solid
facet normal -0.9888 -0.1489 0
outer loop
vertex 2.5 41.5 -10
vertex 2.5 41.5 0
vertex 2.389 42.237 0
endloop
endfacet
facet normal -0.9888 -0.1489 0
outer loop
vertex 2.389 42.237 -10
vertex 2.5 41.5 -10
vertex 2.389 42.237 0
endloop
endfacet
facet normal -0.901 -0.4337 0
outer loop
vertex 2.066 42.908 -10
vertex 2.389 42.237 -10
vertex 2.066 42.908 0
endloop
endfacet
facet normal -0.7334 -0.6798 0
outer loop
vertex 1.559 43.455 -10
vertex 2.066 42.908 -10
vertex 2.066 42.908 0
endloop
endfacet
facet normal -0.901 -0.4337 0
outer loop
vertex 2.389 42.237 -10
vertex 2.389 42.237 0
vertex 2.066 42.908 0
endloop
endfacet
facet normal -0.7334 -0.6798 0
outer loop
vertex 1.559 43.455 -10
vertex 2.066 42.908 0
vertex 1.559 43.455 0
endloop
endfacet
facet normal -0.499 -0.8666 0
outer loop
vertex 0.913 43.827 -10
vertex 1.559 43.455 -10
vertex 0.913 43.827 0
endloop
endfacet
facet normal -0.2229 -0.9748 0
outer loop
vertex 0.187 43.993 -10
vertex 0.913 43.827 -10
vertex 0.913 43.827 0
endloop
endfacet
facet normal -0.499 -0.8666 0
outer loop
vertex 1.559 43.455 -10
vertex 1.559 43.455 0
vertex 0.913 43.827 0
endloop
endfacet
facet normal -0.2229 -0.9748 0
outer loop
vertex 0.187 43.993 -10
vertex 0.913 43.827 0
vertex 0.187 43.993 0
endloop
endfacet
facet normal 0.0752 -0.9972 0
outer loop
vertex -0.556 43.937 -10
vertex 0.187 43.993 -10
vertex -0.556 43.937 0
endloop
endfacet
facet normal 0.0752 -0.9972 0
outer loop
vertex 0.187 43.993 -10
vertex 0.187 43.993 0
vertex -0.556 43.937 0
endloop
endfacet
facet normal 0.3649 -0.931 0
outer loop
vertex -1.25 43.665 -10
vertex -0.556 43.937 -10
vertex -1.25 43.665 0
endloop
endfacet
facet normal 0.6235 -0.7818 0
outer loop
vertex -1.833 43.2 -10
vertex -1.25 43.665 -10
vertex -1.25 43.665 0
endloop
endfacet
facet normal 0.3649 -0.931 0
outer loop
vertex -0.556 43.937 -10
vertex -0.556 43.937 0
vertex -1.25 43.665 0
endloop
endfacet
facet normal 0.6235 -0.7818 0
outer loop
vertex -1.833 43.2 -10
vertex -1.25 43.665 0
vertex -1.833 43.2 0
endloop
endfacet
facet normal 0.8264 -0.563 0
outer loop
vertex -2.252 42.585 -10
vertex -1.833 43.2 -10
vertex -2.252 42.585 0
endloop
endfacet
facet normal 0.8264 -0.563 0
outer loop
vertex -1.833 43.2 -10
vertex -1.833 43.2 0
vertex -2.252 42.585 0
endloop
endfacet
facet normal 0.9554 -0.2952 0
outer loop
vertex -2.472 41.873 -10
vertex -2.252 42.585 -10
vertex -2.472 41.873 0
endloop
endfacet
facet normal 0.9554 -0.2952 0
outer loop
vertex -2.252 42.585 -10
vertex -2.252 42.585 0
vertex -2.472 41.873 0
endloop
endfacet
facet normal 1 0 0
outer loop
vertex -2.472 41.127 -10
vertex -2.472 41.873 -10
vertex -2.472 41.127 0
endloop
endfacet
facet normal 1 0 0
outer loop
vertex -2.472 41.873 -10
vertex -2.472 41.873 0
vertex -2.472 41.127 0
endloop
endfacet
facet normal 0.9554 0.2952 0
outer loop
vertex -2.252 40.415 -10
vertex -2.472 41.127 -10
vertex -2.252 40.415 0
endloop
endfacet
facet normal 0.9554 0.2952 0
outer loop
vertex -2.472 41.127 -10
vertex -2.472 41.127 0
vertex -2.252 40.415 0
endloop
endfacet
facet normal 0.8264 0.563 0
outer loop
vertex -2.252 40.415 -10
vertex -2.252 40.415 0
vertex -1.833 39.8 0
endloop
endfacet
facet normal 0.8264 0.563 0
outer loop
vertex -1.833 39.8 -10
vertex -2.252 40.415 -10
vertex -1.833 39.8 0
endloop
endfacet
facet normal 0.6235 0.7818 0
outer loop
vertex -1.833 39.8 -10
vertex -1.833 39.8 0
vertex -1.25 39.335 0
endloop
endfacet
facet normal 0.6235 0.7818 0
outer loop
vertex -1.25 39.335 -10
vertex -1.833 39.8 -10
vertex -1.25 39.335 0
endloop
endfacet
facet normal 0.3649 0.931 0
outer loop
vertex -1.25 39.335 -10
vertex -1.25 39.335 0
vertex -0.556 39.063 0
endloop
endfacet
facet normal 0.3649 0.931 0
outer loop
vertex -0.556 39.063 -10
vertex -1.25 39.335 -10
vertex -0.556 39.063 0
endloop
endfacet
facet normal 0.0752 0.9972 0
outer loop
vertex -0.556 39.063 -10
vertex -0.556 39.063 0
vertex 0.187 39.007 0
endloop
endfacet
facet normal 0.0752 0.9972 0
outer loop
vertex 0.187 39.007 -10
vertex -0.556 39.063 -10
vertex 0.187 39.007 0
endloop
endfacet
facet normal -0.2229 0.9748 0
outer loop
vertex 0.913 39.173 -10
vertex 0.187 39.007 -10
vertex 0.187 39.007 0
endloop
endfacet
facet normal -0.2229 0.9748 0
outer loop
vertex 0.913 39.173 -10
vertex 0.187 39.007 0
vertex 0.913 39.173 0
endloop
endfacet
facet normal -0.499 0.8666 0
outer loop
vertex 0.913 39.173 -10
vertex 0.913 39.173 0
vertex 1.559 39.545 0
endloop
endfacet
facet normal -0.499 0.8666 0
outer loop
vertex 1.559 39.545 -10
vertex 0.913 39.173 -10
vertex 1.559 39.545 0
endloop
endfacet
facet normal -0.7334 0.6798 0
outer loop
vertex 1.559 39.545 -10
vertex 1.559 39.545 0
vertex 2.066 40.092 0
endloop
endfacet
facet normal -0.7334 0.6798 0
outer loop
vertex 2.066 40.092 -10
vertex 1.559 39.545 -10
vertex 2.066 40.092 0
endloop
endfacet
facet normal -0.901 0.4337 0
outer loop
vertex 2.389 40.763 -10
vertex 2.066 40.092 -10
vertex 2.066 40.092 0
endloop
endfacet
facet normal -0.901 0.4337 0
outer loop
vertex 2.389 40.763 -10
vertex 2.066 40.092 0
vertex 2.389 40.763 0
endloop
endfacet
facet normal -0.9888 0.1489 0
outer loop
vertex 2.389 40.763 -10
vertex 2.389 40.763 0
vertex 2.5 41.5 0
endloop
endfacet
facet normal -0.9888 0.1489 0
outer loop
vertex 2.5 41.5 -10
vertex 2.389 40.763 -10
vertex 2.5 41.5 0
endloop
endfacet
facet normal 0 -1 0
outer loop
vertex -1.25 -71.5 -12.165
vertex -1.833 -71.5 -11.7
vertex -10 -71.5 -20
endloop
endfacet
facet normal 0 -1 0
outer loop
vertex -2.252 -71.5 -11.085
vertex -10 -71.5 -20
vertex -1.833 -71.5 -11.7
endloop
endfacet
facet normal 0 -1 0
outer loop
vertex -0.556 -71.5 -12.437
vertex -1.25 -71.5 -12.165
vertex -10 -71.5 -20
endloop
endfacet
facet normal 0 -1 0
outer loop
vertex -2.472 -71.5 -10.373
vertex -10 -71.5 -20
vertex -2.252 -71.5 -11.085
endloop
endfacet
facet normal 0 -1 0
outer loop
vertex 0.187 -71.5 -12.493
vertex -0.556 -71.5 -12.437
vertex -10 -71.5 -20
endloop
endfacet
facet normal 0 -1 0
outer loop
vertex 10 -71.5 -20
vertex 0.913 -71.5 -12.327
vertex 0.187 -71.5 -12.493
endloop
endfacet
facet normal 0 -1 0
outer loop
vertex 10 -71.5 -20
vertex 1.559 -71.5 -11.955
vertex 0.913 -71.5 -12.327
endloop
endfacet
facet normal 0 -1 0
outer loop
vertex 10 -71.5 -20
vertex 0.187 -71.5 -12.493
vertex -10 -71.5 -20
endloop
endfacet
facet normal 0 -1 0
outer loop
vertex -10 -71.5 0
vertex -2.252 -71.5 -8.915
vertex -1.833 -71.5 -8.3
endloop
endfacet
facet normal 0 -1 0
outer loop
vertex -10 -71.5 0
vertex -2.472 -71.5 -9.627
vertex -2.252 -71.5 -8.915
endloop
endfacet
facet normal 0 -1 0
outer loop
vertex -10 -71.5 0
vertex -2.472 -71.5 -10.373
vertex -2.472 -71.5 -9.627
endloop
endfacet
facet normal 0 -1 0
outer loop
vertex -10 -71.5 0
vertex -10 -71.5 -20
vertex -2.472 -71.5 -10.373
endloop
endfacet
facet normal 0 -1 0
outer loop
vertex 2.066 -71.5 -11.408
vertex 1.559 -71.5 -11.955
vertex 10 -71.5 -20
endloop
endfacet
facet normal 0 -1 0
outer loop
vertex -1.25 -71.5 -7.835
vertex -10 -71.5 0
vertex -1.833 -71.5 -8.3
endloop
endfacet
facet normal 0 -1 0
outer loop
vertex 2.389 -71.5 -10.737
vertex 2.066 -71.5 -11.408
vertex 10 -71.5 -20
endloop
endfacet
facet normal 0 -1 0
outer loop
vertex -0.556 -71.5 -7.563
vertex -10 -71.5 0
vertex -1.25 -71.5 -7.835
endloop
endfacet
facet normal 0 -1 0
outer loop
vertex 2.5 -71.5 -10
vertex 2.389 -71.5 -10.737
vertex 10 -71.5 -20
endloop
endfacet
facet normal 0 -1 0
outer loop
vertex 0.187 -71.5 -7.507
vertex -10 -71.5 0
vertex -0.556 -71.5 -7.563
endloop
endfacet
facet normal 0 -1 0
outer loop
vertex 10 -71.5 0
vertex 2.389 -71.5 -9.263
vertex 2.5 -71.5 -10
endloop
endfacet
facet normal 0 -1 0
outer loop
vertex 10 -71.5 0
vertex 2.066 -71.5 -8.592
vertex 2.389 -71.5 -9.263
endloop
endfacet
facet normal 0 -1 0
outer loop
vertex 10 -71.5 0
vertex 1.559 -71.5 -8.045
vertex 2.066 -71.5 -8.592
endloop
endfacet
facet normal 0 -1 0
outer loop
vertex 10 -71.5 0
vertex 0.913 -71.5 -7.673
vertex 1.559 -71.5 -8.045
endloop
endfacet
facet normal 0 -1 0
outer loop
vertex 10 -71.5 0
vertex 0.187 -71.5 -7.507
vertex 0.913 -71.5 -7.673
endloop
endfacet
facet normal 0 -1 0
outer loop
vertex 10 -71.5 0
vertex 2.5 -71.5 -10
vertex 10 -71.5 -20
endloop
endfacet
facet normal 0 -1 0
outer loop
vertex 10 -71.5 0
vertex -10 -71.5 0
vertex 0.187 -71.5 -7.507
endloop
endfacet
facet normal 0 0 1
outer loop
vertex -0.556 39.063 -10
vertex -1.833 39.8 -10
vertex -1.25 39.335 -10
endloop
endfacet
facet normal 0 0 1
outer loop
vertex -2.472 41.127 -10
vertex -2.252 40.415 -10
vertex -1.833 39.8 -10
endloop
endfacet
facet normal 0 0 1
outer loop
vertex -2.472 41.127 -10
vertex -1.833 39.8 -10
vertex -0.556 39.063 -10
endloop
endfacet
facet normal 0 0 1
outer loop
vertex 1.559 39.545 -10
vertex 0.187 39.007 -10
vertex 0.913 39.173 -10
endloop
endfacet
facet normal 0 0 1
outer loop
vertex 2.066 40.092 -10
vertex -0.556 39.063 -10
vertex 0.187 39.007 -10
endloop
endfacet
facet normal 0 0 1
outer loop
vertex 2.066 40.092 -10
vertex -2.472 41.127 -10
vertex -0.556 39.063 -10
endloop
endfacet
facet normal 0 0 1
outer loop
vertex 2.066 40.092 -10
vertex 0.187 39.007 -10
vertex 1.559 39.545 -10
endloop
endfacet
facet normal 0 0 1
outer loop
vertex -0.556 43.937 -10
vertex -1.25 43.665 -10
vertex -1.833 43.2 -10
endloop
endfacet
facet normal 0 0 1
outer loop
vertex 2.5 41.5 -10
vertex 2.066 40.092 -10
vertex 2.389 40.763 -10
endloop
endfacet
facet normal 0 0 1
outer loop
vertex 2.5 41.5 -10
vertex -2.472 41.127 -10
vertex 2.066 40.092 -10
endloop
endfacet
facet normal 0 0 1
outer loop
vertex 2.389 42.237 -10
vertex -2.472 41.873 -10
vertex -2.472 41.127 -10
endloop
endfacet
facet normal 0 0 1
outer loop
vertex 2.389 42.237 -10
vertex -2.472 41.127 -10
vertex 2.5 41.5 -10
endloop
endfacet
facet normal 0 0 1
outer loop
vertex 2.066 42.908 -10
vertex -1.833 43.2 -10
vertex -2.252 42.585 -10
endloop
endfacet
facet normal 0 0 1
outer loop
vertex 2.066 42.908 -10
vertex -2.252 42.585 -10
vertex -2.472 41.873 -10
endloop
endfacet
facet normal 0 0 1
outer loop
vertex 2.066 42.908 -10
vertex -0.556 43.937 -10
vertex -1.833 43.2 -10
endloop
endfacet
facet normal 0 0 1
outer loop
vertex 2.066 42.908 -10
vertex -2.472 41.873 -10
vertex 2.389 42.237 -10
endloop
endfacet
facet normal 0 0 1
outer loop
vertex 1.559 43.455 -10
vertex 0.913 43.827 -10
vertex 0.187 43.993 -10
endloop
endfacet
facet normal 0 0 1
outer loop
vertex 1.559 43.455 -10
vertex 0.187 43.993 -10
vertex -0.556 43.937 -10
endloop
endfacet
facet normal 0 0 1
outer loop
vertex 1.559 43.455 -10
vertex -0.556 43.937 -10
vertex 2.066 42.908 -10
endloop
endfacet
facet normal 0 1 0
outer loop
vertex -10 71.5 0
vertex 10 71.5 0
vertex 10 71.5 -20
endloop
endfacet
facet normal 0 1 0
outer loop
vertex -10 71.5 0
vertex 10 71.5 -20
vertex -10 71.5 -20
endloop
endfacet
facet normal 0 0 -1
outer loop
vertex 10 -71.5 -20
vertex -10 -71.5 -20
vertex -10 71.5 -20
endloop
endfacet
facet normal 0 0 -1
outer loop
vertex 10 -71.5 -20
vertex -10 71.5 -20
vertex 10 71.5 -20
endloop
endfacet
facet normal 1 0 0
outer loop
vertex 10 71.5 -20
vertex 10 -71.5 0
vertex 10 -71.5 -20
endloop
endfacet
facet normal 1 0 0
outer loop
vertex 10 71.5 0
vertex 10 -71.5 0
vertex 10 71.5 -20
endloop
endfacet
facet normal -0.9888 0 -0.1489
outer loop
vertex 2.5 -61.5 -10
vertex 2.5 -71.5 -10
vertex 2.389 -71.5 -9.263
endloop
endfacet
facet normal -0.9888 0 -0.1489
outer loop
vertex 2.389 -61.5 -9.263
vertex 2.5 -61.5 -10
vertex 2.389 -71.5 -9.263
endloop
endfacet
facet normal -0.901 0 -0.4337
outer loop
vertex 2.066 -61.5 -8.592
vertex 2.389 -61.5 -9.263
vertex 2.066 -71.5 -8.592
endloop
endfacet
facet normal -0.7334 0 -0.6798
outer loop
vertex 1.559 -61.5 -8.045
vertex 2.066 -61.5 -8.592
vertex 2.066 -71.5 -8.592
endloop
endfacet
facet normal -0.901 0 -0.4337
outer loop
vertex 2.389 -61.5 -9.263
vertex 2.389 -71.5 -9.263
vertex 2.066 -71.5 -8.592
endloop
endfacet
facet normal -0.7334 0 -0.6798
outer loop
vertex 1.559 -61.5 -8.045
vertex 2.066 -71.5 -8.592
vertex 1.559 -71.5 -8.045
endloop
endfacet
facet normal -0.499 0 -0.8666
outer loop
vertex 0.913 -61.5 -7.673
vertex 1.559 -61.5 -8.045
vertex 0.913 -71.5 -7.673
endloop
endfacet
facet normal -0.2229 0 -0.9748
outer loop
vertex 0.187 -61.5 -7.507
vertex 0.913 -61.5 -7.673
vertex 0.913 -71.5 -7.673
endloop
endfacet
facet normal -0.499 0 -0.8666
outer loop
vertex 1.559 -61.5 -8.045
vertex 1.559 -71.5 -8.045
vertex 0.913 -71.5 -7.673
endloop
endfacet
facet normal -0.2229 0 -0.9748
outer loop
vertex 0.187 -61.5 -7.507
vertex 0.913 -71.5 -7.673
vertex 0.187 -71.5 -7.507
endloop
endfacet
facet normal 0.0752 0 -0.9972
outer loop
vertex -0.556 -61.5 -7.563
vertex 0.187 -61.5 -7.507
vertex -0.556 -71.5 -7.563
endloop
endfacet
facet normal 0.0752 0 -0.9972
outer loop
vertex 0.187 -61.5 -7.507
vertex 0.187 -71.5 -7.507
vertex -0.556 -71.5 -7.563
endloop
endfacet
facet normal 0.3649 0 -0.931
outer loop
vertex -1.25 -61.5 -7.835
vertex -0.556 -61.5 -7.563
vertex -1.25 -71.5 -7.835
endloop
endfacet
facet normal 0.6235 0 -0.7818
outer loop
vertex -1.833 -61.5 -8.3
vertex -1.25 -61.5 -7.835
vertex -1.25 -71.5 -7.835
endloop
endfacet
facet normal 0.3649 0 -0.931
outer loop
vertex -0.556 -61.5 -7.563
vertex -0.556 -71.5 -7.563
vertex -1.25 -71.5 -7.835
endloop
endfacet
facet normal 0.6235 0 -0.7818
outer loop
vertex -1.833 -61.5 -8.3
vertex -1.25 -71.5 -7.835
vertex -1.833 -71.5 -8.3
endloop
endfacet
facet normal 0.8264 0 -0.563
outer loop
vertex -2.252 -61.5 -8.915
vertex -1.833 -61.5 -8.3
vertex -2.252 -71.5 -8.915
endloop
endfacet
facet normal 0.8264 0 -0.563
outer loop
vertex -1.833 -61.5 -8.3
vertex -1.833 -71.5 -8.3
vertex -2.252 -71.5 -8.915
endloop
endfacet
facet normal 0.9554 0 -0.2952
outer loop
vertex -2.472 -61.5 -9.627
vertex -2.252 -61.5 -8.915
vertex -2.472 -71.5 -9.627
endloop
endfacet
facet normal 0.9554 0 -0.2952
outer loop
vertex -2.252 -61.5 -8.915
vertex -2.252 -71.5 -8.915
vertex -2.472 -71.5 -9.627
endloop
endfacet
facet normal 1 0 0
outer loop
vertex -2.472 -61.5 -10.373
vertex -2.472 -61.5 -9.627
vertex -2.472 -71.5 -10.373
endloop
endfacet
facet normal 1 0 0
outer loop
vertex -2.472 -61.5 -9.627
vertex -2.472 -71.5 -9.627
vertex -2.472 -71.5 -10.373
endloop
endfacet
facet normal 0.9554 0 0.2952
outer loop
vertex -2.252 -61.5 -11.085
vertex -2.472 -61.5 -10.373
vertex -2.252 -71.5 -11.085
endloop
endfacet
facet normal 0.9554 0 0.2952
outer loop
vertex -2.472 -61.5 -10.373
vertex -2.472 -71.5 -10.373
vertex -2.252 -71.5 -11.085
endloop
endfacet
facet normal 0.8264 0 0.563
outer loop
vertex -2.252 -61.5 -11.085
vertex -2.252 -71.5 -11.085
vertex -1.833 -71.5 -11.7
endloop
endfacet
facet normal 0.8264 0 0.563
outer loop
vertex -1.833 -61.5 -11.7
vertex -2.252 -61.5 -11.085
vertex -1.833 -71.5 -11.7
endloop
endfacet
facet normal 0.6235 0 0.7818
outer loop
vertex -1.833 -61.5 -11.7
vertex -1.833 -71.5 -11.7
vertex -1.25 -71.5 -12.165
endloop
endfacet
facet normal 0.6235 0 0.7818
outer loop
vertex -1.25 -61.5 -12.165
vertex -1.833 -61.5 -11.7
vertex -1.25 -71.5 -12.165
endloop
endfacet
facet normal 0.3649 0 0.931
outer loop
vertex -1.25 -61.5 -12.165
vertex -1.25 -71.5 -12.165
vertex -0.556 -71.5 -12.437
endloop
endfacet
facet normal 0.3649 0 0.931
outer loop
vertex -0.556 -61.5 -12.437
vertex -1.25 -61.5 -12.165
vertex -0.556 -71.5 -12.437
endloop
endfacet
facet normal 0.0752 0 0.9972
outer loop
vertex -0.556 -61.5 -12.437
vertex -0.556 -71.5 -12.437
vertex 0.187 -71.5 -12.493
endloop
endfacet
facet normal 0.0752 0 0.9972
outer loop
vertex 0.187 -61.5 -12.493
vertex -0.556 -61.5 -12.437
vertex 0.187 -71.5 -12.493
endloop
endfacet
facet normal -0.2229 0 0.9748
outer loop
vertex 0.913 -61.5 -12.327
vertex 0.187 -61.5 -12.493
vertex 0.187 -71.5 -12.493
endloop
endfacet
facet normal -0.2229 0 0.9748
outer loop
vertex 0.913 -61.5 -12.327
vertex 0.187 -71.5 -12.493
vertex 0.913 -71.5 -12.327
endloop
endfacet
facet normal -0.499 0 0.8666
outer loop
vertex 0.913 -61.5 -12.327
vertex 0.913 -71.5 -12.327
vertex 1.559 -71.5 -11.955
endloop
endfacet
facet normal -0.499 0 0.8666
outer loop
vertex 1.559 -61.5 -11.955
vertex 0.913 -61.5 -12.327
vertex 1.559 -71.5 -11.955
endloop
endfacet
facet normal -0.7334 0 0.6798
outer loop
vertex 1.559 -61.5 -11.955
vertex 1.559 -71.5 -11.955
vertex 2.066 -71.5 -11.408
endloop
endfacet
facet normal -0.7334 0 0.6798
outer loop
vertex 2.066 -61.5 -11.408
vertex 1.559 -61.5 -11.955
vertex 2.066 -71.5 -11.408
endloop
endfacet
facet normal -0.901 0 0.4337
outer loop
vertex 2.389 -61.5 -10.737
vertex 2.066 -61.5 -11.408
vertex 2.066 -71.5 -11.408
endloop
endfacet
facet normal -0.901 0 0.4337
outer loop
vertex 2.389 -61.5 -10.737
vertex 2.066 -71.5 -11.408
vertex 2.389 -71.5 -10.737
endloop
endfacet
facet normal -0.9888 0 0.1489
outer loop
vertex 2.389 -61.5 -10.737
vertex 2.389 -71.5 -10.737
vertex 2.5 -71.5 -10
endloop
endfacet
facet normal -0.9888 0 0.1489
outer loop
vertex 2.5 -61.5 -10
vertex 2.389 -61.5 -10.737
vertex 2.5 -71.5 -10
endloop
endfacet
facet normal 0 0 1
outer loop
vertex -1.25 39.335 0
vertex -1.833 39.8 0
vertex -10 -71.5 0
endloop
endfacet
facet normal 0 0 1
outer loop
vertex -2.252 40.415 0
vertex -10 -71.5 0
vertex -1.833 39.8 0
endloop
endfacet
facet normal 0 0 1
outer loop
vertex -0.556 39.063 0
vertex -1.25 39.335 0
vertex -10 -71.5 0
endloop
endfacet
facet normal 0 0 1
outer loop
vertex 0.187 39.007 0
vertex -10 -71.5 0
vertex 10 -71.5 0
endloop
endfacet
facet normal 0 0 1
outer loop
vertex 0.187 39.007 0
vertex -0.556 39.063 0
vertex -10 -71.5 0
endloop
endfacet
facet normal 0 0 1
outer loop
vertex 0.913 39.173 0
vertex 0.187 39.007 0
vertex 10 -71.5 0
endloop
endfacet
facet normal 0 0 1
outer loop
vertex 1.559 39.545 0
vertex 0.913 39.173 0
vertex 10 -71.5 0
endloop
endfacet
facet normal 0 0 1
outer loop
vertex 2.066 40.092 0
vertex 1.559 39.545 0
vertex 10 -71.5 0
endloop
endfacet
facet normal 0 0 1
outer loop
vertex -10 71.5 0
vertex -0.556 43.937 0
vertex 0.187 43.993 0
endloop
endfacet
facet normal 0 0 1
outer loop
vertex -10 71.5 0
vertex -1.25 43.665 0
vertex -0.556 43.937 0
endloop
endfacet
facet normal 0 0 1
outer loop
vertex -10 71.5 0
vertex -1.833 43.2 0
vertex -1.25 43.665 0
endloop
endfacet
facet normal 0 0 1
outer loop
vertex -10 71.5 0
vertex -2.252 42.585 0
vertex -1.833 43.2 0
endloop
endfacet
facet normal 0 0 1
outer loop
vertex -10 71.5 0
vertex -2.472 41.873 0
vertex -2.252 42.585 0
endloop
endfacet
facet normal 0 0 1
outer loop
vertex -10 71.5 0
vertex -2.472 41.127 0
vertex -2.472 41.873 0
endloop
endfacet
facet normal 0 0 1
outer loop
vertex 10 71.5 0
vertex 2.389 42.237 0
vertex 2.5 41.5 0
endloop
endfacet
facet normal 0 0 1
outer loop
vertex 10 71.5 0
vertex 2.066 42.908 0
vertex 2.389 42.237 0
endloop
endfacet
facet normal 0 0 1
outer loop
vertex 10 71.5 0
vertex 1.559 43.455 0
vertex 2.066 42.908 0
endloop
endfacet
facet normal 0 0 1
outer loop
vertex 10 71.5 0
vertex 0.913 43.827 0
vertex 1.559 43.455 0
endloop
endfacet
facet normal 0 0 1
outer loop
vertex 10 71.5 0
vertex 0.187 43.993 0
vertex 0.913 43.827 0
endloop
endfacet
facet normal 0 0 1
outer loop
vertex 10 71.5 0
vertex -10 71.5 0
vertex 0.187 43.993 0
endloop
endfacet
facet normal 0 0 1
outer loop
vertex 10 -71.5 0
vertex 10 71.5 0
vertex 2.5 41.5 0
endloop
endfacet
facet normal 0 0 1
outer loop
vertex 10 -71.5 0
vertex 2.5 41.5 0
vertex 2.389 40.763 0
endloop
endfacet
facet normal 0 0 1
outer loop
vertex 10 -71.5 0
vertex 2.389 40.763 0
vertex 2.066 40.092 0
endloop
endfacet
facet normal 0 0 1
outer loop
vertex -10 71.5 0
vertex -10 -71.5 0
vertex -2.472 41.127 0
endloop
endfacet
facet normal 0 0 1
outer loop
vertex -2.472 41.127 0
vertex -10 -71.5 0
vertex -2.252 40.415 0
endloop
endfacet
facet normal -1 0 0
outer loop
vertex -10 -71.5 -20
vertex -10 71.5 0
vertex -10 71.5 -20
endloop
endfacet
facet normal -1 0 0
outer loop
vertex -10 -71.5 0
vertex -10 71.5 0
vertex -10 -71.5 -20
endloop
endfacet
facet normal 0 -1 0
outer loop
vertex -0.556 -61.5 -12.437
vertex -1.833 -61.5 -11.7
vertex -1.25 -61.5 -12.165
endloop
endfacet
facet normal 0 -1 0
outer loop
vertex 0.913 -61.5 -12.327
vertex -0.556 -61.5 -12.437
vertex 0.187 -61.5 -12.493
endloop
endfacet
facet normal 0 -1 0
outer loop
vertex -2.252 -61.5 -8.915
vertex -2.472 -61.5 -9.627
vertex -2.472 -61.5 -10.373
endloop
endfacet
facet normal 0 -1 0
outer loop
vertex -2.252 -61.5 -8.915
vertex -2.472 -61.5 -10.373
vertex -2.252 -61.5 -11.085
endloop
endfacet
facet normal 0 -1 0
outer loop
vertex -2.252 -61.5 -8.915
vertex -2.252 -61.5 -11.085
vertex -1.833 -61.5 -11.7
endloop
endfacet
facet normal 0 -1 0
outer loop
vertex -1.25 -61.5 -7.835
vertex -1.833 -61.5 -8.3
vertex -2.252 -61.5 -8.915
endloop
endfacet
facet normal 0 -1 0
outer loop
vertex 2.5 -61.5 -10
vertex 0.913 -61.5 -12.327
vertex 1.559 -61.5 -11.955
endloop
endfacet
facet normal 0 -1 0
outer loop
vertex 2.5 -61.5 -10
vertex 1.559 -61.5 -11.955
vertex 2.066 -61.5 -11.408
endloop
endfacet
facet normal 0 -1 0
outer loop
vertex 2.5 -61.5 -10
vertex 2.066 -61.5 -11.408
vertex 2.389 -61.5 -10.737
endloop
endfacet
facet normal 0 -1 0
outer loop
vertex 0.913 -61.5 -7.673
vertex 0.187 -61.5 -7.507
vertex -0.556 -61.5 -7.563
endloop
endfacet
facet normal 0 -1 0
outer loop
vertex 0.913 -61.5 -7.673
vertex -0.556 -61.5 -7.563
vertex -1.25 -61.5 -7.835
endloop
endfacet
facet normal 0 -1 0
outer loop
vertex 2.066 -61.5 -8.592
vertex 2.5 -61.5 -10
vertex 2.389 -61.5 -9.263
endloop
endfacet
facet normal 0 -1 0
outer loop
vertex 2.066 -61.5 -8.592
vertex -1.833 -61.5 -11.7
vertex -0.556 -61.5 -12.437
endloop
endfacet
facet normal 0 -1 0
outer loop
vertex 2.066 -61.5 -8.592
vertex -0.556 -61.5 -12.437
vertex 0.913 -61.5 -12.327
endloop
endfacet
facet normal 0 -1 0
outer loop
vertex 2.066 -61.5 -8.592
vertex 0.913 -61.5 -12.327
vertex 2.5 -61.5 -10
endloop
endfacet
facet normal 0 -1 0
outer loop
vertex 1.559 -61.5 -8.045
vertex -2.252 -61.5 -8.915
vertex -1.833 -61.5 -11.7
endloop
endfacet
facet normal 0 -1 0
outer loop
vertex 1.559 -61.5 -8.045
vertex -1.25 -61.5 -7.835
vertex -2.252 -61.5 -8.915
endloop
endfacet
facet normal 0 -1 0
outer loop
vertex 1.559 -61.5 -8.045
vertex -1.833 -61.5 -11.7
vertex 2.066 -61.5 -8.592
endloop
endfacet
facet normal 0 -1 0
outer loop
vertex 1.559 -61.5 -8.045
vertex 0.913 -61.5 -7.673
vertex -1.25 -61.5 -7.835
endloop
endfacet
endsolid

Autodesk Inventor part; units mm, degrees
ref_plane "YZ Plane" through (0, 0, 0) normal (1, 0, 0) x (0, 1, 0)
ref_plane "XZ Plane" through (0, 0, 0) normal (0, 1, 0) x (-1, 0, 0)
ref_plane "XY Plane" through (0, 0, 0) normal (0, 0, 1) x (1, 0, 0)
sketch "Boceto1" plane through (0, 0, 0) normal (0, 0, 1) x (1, 0, 0)
  line L0 (-10, -71.5) -> (10, -71.5)
  line L1 (10, -71.5) -> (10, 71.5)
  line L2 (10, 71.5) -> (-10, 71.5)
  line L3 (-10, 71.5) -> (-10, -71.5)
  line L4 (-10, -71.5) -> (10, 71.5) construction
  line L5 (10, -71.5) -> (-10, 71.5) construction
  point P0 (0, 0)
  dimension "d0" = 20
  dimension "d1" = 143
extrude "Extrusión1" add sketch "Boceto1" against normal blind 20
sketch "Boceto2" plane through (0, 0, 0) normal (0, 0, 1) x (1, 0, 0)
  line L0 (-10, 71.5) -> (10, 71.5) projected
  circle A0 centre (0, 41.5) radius 2.5
  point P0 (0, 0)
  dimension "d5" = 5
extrude "Extrusión2" cut sketch "Boceto2" against normal blind 10
thread "Rosca1" size "M5x0.8" class "6H" standard "ANSI Metric M Profile" full length
sketch "Boceto3" plane through (-10, -71.5, 0) normal (0, -1, 0) x (1, 0, 0)
  circle A0 centre (10, -10) radius 2.5
  point P0 (10, 0)
extrude "Extrusión3" cut sketch "Boceto3" against normal blind 10
thread "Rosca2" size "M5x0.8" class "6H" standard "ANSI Metric M Profile" full length
properties part number "Suport_Cam"
